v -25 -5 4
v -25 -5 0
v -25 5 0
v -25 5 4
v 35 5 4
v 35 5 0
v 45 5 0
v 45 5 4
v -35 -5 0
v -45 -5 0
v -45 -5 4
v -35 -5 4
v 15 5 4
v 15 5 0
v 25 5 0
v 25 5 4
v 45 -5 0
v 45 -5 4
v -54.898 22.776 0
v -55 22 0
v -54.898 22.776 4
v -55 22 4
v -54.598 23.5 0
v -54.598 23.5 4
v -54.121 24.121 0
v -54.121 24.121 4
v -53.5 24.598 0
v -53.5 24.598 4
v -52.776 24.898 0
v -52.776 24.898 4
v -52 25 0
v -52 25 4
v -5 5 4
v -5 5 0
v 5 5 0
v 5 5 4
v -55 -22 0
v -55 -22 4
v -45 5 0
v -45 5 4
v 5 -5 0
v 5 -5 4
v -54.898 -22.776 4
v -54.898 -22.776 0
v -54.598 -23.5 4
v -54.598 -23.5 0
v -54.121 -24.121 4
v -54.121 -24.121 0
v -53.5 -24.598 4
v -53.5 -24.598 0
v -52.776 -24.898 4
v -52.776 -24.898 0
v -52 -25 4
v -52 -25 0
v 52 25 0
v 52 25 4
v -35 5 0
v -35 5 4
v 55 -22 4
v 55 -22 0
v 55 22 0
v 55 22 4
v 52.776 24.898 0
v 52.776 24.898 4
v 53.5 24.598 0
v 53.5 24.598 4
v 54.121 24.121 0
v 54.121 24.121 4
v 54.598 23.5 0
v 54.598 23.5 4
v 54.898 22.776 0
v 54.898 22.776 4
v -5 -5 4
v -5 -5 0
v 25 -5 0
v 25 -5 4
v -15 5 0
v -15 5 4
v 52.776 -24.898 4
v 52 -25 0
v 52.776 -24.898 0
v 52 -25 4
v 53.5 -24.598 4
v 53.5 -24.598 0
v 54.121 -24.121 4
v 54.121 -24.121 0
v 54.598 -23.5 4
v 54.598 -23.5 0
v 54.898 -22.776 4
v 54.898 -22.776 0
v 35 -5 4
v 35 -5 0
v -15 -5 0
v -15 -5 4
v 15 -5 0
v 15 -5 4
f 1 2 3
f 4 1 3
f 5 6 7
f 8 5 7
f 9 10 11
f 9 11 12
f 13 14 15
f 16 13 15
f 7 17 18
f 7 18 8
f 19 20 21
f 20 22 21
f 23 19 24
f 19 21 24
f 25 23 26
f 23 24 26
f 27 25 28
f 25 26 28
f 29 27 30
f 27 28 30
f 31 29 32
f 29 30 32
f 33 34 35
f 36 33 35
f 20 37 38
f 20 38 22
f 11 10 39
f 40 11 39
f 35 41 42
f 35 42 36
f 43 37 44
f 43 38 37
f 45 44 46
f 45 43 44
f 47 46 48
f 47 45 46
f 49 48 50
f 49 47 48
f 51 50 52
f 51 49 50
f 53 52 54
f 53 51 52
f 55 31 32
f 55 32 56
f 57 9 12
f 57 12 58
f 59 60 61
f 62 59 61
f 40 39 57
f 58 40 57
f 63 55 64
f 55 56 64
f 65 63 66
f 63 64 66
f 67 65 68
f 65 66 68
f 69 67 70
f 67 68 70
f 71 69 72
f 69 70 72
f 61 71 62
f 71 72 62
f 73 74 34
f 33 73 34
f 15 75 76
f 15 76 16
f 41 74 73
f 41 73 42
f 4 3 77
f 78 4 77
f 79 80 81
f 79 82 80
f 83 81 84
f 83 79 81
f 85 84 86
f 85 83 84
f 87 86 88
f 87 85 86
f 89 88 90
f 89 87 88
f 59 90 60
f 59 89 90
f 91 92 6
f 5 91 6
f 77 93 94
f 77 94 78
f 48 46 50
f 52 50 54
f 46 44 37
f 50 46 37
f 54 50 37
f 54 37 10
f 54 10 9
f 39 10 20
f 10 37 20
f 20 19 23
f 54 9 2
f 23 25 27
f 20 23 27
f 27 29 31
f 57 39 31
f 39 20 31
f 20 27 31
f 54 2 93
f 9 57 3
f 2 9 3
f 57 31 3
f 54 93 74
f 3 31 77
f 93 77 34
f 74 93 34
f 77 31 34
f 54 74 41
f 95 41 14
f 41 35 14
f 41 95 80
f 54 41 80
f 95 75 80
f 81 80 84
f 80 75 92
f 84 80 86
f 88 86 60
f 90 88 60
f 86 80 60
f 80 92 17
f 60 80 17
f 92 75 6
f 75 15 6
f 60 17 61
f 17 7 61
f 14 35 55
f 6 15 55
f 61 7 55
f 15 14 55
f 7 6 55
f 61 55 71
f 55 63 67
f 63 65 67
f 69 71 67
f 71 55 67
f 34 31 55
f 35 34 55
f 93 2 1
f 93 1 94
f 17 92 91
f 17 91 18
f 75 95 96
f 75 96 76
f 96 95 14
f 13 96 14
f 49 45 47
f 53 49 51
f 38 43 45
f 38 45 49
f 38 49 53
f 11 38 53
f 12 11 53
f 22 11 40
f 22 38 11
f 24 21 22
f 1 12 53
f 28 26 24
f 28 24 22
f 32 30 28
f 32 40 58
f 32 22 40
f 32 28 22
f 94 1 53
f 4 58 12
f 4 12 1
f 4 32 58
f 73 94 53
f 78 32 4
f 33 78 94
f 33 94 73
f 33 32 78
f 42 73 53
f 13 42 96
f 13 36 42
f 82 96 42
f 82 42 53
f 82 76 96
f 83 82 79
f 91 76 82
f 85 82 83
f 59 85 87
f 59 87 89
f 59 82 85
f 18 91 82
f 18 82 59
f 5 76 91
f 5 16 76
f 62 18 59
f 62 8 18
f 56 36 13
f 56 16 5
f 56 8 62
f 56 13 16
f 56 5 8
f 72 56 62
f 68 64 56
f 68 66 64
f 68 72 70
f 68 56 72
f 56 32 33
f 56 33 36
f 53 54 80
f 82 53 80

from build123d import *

# Parameters (mm, degrees)
ESQUISSE1_W        = 110
ESQUISSE1_H        = 50
ESQUISSE1_W_2      = 10
ESQUISSE1_H_2      = 10
BOSS_EXTRU_1_DEPTH = 4
CONG_1_R           = 3


with BuildPart() as part:
    # Esquisse1 → Boss.-Extru.1 (new body)
    with BuildSketch(Plane.XY):
        Rectangle(ESQUISSE1_W, ESQUISSE1_H)
        with Locations((-20, 0)):
            Rectangle(ESQUISSE1_W_2, ESQUISSE1_H_2, mode=Mode.SUBTRACT)
        with Locations((-40, 0)):
            Rectangle(ESQUISSE1_W_2, ESQUISSE1_H_2, mode=Mode.SUBTRACT)
        Rectangle(ESQUISSE1_W_2, ESQUISSE1_H_2, mode=Mode.SUBTRACT)
        with Locations((20, 0)):
            Rectangle(ESQUISSE1_W_2, ESQUISSE1_H_2, mode=Mode.SUBTRACT)
        with Locations((40, 0)):
            Rectangle(ESQUISSE1_W_2, ESQUISSE1_H_2, mode=Mode.SUBTRACT)
    extrude(amount=BOSS_EXTRU_1_DEPTH)

    # Congé1
    cong_1_edges = [part.edges().sort_by_distance(p)[0] for p in [
        (-55, 25, 2),
        (55, 25, 2),
        (55, -25, 2),
        (-55, -25, 2),
    ]]
    fillet(cong_1_edges, radius=CONG_1_R)


solid = part.part
